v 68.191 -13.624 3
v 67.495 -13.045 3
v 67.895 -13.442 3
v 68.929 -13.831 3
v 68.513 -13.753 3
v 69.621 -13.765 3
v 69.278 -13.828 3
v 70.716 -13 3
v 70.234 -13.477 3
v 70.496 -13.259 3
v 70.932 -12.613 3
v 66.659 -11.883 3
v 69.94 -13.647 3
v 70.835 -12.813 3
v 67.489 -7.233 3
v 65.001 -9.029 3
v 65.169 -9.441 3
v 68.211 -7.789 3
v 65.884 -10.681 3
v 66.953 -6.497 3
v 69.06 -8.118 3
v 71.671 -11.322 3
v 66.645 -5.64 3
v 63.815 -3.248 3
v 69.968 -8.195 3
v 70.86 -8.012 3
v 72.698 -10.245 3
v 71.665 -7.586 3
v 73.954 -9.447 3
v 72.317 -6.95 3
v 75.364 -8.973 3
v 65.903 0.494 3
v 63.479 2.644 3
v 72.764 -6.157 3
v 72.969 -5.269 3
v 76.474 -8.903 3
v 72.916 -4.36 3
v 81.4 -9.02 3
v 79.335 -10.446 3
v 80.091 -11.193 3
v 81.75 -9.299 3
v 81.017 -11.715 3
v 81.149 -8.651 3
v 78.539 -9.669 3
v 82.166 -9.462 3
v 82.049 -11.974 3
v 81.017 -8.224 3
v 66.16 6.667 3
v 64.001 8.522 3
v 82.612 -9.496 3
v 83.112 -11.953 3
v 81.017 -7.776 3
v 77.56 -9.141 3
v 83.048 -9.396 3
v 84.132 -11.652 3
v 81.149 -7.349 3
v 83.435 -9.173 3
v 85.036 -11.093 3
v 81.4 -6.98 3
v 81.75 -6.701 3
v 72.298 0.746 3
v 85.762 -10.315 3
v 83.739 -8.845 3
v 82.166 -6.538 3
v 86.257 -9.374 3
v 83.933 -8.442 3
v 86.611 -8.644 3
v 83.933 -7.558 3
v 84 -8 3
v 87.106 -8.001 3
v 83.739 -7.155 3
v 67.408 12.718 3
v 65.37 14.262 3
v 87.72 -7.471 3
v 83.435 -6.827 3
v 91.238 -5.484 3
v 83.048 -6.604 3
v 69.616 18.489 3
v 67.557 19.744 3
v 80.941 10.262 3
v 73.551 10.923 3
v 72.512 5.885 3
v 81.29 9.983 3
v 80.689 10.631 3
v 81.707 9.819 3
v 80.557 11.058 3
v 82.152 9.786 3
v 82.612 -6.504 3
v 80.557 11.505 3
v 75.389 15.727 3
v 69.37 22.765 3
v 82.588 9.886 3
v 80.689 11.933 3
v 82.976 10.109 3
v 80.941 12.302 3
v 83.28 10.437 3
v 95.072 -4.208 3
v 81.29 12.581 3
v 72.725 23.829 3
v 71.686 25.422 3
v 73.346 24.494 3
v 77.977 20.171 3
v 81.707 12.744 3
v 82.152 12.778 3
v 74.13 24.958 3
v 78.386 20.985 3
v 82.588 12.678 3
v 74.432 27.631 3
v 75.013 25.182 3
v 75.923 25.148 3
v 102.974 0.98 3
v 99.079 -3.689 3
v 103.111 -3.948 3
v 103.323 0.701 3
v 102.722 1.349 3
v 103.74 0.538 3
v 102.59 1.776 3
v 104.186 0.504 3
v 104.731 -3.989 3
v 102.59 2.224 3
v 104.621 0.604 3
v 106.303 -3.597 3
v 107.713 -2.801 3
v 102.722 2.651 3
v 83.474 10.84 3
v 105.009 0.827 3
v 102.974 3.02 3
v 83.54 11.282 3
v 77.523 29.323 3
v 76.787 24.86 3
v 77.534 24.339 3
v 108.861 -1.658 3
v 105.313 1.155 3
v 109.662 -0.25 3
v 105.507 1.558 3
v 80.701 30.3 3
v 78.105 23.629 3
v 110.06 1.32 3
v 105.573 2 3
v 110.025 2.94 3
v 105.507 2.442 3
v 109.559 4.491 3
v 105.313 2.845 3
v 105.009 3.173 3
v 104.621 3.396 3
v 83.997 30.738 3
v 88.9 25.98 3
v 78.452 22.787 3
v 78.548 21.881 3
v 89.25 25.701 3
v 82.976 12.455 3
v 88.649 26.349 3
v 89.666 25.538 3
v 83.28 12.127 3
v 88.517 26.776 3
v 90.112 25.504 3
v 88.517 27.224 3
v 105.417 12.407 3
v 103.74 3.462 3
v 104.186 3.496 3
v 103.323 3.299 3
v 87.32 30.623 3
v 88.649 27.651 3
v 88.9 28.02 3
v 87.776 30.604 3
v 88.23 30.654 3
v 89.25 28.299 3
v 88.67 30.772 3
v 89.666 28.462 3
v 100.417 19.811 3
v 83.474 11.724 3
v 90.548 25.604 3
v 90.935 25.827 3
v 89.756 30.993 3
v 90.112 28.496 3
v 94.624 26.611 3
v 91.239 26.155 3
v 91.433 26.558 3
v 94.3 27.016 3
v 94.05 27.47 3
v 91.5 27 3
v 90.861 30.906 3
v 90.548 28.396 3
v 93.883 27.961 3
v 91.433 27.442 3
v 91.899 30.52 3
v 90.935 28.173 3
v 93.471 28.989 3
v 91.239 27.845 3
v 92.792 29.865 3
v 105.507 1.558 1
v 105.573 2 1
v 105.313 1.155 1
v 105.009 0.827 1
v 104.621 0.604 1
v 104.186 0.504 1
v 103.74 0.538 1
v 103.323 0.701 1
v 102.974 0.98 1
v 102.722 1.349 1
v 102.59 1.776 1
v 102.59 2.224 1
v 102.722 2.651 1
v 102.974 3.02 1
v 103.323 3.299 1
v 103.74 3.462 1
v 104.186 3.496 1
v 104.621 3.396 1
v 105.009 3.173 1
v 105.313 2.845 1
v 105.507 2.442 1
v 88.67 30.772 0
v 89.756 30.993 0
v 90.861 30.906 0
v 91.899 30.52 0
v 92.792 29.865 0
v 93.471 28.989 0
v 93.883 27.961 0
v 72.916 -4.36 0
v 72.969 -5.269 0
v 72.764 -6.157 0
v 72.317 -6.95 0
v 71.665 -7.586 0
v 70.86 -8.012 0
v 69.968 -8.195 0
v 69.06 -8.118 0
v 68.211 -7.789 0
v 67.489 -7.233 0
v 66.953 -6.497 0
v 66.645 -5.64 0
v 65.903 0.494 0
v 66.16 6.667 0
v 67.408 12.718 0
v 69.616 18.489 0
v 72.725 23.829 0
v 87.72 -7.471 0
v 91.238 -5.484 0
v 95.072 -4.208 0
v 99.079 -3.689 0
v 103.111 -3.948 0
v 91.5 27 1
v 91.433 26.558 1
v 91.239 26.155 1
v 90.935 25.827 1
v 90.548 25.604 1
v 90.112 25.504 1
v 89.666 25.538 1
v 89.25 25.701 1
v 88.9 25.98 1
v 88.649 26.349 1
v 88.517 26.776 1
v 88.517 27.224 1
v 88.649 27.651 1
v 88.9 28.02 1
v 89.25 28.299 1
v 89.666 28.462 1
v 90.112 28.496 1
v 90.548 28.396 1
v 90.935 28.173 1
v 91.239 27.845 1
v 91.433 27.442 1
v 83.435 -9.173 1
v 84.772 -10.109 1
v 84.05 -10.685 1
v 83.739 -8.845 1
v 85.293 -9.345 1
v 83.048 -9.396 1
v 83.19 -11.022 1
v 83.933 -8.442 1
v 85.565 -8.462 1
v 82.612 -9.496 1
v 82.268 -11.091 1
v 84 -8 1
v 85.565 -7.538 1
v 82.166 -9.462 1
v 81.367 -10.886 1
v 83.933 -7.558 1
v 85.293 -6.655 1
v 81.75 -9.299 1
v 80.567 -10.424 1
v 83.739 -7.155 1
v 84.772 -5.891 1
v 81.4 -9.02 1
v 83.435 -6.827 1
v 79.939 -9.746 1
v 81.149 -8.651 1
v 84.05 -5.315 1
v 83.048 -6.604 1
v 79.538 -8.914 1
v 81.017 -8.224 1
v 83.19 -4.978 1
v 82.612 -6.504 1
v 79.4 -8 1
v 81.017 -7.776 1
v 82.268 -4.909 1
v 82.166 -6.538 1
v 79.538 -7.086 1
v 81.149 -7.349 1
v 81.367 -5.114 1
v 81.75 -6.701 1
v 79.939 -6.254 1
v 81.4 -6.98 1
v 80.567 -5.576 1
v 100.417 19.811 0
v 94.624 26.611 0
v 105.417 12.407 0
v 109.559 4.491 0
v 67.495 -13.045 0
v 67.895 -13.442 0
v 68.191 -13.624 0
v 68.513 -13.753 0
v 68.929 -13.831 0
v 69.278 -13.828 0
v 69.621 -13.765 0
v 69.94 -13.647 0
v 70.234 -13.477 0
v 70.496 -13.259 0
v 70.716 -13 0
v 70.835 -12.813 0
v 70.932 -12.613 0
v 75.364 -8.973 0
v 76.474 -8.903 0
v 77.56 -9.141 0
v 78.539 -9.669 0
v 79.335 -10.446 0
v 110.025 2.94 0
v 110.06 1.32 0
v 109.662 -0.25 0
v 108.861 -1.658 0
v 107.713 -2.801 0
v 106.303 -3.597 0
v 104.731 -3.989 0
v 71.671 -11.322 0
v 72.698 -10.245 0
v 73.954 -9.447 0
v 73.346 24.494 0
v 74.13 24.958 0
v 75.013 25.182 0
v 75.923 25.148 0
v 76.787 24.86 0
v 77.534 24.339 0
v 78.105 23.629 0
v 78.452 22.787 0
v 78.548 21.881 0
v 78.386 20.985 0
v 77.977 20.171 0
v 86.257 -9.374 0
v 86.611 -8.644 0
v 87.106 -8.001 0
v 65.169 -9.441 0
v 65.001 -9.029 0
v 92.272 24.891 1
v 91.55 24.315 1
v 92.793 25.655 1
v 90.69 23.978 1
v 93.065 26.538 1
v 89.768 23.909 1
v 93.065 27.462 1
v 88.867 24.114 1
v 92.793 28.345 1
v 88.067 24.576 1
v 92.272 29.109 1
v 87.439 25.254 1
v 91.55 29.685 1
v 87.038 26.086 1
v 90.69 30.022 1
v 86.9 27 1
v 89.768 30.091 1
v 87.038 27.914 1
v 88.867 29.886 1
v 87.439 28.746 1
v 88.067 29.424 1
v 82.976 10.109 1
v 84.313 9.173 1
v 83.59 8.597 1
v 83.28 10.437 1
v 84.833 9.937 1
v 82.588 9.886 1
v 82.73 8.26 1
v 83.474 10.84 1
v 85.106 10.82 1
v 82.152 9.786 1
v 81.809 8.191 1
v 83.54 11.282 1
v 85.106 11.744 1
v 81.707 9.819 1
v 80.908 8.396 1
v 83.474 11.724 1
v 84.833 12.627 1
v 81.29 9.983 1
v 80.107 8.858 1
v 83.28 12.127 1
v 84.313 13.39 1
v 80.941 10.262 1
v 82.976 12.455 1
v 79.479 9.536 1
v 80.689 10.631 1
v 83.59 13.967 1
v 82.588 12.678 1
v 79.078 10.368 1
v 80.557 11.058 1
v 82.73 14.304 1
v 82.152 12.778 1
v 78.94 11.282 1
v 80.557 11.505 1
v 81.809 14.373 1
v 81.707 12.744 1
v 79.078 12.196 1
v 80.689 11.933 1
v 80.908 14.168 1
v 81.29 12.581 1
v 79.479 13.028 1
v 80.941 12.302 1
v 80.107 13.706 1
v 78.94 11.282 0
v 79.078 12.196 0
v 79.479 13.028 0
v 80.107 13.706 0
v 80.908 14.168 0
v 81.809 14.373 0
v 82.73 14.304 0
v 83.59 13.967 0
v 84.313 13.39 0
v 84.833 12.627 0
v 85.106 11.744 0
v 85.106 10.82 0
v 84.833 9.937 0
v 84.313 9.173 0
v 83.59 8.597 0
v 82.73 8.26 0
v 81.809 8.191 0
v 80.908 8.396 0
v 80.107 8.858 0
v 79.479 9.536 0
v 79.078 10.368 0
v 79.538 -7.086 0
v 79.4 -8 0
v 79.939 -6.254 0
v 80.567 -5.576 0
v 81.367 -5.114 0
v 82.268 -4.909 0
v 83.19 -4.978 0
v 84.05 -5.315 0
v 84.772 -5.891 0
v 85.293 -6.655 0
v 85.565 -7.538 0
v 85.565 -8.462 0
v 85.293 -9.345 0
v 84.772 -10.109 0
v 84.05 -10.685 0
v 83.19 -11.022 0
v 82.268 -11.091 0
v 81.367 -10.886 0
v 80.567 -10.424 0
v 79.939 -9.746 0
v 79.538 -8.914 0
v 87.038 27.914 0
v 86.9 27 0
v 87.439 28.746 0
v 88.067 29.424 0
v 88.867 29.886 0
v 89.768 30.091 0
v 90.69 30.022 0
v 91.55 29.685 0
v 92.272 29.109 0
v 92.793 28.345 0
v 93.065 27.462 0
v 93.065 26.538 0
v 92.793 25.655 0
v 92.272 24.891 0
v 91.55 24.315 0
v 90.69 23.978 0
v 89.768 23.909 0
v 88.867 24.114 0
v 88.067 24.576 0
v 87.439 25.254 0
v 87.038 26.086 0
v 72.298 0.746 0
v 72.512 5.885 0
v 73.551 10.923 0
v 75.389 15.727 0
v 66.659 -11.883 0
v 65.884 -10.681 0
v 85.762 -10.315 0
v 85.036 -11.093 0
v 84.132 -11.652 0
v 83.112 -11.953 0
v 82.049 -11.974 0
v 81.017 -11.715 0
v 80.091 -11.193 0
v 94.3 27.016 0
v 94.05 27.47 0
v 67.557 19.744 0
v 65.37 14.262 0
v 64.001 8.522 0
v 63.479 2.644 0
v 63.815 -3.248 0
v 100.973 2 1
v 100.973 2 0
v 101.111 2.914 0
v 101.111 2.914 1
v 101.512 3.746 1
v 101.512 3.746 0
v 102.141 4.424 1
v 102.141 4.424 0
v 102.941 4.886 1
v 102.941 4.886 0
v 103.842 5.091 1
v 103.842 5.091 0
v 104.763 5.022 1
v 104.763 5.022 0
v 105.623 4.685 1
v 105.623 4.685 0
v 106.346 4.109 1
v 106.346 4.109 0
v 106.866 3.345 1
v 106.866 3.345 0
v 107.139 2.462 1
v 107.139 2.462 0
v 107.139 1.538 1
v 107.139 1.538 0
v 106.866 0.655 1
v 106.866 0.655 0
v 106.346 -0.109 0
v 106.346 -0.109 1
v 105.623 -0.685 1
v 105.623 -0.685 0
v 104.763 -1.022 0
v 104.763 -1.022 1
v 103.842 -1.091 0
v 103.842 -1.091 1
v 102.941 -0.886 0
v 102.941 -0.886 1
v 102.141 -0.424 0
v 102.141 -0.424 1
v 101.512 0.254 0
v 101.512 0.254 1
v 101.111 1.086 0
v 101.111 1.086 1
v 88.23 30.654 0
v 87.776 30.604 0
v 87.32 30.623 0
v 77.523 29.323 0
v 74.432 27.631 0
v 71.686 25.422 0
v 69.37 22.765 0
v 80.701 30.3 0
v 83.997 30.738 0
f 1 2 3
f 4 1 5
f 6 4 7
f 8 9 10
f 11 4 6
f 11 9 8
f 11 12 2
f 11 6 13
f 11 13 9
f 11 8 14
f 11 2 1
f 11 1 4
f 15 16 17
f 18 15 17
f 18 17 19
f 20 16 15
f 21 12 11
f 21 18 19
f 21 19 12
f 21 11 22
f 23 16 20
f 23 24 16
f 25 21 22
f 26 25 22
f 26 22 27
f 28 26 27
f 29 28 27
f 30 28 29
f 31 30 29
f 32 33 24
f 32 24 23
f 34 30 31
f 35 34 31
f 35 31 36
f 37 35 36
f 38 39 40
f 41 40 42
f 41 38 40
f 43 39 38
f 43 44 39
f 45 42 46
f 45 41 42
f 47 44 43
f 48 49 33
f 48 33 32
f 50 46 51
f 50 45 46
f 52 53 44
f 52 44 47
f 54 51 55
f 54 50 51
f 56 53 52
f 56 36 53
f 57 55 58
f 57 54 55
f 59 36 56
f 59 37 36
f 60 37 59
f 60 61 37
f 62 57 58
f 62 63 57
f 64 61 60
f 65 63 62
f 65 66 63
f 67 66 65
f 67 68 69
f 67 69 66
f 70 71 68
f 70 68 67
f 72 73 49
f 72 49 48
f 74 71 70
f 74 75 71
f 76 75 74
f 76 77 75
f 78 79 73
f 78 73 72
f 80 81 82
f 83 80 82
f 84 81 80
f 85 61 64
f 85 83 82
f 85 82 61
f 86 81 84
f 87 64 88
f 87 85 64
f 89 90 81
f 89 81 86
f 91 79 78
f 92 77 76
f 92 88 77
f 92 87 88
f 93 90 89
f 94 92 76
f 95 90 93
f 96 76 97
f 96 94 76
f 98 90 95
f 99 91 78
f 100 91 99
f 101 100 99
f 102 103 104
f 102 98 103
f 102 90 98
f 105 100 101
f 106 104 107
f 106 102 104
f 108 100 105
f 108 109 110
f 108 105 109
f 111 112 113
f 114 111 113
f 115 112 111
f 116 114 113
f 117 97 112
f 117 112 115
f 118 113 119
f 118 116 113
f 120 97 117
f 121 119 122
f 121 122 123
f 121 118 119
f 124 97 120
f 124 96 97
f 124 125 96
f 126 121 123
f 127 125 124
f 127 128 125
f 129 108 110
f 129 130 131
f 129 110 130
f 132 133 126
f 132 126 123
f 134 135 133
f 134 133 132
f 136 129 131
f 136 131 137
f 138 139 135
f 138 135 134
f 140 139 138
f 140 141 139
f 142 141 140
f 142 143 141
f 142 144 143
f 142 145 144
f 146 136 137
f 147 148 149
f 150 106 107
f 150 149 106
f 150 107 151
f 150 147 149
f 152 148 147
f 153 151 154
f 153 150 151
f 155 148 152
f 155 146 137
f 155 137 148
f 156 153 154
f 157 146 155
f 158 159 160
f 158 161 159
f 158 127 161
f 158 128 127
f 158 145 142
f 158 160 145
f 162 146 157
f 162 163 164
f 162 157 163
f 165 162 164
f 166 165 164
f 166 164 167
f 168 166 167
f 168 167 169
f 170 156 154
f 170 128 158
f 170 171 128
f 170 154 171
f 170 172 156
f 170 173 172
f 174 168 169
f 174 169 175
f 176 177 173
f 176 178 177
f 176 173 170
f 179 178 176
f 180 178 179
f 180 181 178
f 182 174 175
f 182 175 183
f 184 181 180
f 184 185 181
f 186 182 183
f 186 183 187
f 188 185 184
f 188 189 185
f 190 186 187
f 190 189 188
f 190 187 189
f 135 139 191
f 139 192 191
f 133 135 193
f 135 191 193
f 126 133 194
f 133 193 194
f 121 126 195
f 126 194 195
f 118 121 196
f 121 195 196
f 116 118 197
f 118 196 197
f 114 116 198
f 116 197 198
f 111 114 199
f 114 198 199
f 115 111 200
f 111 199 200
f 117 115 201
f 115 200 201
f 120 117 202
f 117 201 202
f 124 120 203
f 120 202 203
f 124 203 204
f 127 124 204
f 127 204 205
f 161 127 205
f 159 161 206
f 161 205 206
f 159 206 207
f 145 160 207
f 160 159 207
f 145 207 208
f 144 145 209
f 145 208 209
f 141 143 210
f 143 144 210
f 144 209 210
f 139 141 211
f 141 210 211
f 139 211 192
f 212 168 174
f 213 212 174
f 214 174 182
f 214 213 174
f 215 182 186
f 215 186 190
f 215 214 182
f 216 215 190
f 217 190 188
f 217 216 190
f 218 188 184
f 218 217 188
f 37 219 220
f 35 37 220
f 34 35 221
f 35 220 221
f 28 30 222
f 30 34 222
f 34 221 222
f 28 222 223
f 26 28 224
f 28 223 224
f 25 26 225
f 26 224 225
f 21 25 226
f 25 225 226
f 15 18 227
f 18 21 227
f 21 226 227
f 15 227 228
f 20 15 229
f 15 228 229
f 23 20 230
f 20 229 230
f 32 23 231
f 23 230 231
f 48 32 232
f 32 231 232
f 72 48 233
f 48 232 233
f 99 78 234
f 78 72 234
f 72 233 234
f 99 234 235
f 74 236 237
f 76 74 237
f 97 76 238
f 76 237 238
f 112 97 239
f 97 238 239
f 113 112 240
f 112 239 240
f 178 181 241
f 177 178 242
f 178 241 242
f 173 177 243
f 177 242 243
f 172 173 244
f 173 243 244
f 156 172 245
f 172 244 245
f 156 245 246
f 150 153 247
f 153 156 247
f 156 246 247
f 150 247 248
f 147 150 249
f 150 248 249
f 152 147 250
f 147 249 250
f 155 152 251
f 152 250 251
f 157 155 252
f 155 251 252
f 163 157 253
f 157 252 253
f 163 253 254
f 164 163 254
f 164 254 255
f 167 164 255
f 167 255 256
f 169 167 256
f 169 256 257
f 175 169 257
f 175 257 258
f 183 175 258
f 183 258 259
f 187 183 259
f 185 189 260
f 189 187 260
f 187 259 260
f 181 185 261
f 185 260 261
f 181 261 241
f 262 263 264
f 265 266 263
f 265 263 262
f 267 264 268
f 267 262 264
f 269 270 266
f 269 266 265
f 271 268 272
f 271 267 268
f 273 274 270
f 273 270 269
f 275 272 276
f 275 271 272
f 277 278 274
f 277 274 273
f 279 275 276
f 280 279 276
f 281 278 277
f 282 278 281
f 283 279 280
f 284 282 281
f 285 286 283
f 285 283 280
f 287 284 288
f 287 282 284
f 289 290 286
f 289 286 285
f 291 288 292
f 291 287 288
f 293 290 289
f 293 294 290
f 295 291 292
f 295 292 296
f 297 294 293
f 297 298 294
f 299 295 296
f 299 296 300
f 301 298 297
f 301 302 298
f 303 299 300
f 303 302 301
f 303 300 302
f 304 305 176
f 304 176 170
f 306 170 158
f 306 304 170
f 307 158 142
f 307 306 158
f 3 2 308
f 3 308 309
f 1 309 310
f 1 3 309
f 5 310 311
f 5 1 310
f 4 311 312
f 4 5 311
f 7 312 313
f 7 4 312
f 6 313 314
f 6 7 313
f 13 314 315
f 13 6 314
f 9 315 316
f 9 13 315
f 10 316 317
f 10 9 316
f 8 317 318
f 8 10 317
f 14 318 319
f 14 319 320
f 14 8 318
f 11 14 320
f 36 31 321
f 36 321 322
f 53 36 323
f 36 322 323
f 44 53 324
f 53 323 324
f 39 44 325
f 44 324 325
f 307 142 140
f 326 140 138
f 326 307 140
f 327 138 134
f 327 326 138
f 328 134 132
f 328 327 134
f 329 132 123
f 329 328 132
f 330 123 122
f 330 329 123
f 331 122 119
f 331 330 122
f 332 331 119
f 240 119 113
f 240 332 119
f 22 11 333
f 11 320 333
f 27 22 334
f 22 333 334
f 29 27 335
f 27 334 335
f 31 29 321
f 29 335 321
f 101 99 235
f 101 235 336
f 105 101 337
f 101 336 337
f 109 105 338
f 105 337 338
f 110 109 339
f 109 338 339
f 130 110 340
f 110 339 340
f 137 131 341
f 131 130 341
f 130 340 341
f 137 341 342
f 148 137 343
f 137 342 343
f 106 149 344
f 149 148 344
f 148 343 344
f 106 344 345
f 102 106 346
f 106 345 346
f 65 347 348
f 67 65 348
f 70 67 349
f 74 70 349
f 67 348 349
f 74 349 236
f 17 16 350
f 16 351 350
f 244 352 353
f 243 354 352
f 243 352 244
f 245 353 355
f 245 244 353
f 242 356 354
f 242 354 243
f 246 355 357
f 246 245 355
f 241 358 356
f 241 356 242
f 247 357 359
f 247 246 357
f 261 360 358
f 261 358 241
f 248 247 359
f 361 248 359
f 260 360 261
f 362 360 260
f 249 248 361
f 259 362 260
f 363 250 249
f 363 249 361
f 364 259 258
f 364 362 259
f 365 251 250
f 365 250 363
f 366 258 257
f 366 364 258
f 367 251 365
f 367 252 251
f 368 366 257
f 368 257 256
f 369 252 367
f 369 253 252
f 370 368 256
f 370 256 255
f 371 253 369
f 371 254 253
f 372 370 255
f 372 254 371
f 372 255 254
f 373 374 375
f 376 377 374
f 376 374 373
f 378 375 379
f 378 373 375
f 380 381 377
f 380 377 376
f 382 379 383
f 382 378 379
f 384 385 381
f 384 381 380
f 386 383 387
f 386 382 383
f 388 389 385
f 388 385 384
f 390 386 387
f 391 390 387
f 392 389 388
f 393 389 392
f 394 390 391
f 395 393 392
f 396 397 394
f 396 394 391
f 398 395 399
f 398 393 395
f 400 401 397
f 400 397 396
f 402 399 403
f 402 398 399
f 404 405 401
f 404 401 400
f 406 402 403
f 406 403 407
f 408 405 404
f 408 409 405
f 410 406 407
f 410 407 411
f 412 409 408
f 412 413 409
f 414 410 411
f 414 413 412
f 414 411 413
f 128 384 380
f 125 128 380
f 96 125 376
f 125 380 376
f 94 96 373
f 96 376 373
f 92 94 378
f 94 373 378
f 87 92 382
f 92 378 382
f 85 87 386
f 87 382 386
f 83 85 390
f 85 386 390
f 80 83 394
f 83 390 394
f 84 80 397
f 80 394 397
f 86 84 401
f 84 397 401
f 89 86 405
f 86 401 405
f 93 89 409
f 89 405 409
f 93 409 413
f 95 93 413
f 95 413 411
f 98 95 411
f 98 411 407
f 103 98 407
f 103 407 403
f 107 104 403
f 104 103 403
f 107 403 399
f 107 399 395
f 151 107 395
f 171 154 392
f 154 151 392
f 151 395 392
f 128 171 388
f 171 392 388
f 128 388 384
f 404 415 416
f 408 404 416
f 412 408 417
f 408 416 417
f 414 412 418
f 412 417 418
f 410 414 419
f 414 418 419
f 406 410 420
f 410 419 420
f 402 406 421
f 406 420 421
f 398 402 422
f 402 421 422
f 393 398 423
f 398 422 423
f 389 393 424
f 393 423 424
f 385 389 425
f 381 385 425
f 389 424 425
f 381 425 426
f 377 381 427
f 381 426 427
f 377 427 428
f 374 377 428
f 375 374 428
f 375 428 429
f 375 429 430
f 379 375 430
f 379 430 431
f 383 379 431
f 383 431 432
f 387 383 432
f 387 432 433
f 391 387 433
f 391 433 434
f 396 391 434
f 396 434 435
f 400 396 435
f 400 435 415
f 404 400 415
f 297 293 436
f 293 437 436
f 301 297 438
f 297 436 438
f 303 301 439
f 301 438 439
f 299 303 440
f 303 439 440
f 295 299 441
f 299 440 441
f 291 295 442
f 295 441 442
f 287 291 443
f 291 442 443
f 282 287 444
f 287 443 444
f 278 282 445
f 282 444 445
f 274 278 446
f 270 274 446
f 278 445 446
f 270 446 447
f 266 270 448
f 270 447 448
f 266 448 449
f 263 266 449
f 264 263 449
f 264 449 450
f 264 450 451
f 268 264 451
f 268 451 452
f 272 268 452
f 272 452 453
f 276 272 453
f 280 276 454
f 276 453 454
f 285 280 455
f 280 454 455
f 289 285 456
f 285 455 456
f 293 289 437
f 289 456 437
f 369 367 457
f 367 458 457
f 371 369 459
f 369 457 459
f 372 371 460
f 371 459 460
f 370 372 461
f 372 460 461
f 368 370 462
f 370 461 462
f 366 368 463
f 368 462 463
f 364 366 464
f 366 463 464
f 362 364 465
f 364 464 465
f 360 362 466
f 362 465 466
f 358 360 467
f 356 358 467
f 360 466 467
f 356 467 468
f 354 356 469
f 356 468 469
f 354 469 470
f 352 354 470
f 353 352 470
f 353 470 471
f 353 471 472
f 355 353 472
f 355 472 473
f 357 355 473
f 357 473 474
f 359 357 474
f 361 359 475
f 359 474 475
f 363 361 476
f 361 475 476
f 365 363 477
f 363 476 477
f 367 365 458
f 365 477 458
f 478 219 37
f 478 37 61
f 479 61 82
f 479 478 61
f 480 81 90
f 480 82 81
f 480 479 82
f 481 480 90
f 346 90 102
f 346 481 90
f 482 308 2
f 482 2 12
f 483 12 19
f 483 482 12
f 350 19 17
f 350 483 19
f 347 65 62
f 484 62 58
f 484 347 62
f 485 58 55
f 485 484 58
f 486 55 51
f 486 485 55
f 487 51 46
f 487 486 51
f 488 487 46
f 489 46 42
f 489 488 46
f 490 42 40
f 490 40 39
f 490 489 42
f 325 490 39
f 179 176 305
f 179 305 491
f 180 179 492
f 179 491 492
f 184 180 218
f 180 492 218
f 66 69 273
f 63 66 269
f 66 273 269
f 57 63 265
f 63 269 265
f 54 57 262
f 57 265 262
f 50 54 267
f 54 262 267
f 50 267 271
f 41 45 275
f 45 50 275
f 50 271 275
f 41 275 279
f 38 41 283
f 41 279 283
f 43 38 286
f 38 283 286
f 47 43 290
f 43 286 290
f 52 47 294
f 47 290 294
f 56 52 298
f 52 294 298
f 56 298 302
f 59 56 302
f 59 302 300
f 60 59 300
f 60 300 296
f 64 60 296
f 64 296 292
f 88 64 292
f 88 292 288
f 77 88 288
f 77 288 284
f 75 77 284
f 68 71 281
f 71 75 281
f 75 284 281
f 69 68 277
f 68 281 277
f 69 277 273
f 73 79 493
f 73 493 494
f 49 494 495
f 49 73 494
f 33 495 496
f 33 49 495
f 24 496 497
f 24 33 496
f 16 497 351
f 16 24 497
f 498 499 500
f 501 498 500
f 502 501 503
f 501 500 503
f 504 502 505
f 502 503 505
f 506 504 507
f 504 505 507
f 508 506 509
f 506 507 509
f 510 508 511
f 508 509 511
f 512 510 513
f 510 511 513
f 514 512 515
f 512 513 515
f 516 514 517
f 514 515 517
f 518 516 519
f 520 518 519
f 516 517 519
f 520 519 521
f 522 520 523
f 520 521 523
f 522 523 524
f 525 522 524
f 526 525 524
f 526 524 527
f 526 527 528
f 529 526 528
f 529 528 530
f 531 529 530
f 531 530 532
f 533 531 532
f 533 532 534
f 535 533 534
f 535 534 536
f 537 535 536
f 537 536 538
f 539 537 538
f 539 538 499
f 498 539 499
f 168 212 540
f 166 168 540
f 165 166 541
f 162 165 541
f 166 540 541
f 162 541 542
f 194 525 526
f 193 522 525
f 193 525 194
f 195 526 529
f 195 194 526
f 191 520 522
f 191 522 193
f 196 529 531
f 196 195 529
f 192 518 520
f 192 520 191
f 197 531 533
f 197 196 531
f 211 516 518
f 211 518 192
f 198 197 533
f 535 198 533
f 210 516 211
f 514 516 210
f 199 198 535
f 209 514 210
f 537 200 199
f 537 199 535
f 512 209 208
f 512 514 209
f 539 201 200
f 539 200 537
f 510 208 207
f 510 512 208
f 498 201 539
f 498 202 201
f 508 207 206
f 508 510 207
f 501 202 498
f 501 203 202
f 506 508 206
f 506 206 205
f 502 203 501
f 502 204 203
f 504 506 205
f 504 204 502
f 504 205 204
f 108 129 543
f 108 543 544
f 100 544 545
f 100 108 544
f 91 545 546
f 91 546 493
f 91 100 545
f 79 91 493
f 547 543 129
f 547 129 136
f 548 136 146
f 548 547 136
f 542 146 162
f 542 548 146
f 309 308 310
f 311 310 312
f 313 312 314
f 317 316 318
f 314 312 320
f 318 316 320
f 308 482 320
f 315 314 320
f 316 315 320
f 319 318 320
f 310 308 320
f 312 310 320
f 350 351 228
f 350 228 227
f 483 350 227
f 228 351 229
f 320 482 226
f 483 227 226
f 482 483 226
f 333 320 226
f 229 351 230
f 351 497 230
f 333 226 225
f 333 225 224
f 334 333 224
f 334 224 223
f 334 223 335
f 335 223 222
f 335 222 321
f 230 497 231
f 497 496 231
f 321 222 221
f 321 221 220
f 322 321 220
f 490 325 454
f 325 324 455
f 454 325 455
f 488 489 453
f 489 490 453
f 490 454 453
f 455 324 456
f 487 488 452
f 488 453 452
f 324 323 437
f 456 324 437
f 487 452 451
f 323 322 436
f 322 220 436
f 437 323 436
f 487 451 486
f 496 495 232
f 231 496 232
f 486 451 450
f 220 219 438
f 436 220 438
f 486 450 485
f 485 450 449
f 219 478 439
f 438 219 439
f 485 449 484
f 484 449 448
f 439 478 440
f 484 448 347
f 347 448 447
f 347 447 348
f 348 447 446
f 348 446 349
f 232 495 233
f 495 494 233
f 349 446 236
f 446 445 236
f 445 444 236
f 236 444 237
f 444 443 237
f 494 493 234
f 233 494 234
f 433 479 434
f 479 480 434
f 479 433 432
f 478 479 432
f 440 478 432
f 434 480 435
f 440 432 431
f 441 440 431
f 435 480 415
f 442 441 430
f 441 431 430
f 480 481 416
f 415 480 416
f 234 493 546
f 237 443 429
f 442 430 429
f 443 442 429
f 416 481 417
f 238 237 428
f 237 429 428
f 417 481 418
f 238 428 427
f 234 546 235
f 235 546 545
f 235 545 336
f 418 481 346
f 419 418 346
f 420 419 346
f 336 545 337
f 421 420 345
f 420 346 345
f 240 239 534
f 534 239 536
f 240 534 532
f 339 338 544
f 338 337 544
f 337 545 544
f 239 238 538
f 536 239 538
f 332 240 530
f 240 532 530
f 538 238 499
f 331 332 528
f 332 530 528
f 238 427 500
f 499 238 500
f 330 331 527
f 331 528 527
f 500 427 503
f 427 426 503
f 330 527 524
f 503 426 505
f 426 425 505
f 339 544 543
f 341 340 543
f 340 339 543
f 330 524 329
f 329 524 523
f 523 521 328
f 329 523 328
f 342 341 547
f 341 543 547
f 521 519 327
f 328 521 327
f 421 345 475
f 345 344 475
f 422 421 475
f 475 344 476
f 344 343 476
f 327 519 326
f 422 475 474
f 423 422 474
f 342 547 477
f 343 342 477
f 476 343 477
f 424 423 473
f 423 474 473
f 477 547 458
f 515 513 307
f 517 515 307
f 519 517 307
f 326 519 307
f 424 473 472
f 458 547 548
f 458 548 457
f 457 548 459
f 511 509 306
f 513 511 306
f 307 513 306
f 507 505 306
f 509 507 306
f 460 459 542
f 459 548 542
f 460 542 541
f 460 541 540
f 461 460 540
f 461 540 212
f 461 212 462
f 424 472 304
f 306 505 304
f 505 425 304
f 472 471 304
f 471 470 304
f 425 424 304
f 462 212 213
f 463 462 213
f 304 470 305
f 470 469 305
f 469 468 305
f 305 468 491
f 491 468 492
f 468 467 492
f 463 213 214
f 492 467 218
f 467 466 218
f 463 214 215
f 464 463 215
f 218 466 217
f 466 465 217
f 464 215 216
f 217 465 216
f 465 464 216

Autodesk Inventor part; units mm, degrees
ref_plane "YZ Plane" through (0, 0, 0) normal (1, 0, 0) x (0, 1, 0)
ref_plane "XZ Plane" through (0, 0, 0) normal (0, 1, 0) x (-1, 0, 0)
ref_plane "XY Plane" through (0, 0, 0) normal (0, 0, 1) x (1, 0, 0)
sketch "スケッチ1" plane through (0, 0, 0) normal (0, 0, 1) x (1, 0, 0)
  line L0 (108, 72.831817) -> (108, -27.637331) construction
  circle A0 centre (90, 27) radius 3
  circle A1 centre (104.07345, 2) radius 6.025
  circle A2 centre (90, 27) radius 1.5
  circle A3 centre (104.07345, 2) radius 1.5
  circle A4 centre (82.04031, 11.281864) radius 1.5
  circle A5 centre (82.5, -8) radius 3
  circle A6 centre (82.5, -8) radius 1.5
  arc A7 (66.645247, -5.64) -> (72.915941, -4.36) centre (69.780594, -5) ccw
  arc A8 (72.724551, 23.828571) -> (66.645247, -5.64) centre (104.07345, 2) ccw
  arc A9 (77.976723, 20.171429) -> (72.915941, -4.36) centre (104.07345, 2) ccw
  arc A10 (77.976723, 20.171429) -> (72.724551, 23.828571) centre (75.350637, 22) ccw
  circle A11 centre (137.322151, 20) radius 1.25
  circle A12 centre (133.5, -8) radius 3
  circle A13 centre (133.5, -8) radius 1.5
  circle A14 centre (146, 10) radius 1.5
  arc A15 (-6.089587, 13.373015) -> (73.990447, 1.93301) centre (42.288654, 66.020578) ccw construction
  line L1 (108, 72.831817) -> (108, -27.637331) construction
  arc A16 (142.009553, 1.93301) -> (222.089587, 13.373015) centre (173.711346, 66.020578) ccw construction
  arc A17 (142.29705, -19.072921) -> (142.660887, 27.253552) centre (125.709293, 4.222021) ccw
  arc A18 (136.80781, 35.127338) -> (180.06622, 10.718677) centre (180.861669, 62.665248) ccw
  circle A19 centre (137.322151, 20) radius 9.006449
  arc A20 (128.322651, 20.353731) -> (130.555913, -8.5765) centre (253.226204, 15.444317) ccw
  arc A21 (133.414591, -10.998784) -> (152.948723, -4.485529) centre (134.268683, 18.989056) ccw
  arc A22 (35.93378, 10.718677) -> (79.19219, 35.127338) centre (35.138331, 62.665248) ccw
  arc A23 (73.339113, 27.253552) -> (73.70295, -19.072921) centre (90.290707, 4.222021) ccw
  arc A24 (90.887703, 29.865656) -> (71.118535, 25.188537) centre (84.969685, 10.761283) ccw
  arc A25 (109.559222, 4.491371) -> (92.075879, 29.165808) centre (36.719095, -28.589074) ccw
  arc A26 (80.567193, -10.294397) -> (70.653319, -16.566942) centre (76.603177, -15) ccw
  circle A27 centre (76.603177, -15) radius 5 construction
  circle A28 centre (94, -11) radius 1.5
  circle A29 centre (94, -11) radius 3
  arc A30 (103.111347, -3.947687) -> (84.657245, -10.084777) centre (99.757959, -24.678215) ccw
  point P0 (0, 0)
  point P1 (0, 0)
  point P2 (153.490711, -2.560367)
  point P3 (70.420594, -8.135347)
  point P4 (68.814065, 23.104865)
  dimension "d0" = 2
  dimension "d1" = 30
  dimension "d2" = 125
  dimension "d3" = 80
  dimension "d4" = 20
  dimension "d5" = 6
  dimension "d6" = 21
extrude "押し出し1" add sketch "スケッチ1" along normal blind 3 contours A0 | A0 A25 A1 A30 A5 A26 A23 A22 A24 | A1 | A5
fillet "フィレット1" radius 5 1 edges at (68.8141, 23.1049, 1.5)
fillet "フィレット2" radius 2 1 edges at (70.6533, -16.5669, 1.5)
sketch "スケッチ2" plane through (0, 0, 0) normal (0, 0, -1) x (-1, 0, 0)
  circle A0 centre (-82.04031, 11.281864) radius 1.5
  arc A1 (-70.932275, -12.613165) -> (-67.494617, -13.044892) centre (-69.088898, -11.837303) ccw
  arc A2 (-67.494617, -13.044892) -> (-68.54743, 22.797215) centre (-90.290707, 4.222021) ccw
  arc A3 (-68.54743, 22.797215) -> (-69.082243, 23.334729) centre (-72.349055, 19.549502) ccw
  arc A4 (-71.118535, 25.188537) -> (-69.082243, 23.334729) centre (-35.138331, 62.665248) ccw
  arc A5 (-71.118535, 25.188537) -> (-90.887703, 29.865656) centre (-84.969685, 10.761283) ccw
  arc A6 (-90.887703, 29.865656) -> (-92.075879, 29.165808) centre (-90, 27) ccw
  arc A7 (-92.075879, 29.165808) -> (-109.559222, 4.491371) centre (-36.719095, -28.589074) ccw
  arc A8 (-109.559222, 4.491371) -> (-103.111347, -3.947687) centre (-104.07345, 2) ccw
  arc A9 (-84.657245, -10.084777) -> (-103.111347, -3.947687) centre (-99.757959, -24.678215) ccw
  arc A10 (-84.657245, -10.084777) -> (-80.567193, -10.294397) centre (-82.5, -8) ccw
  arc A11 (-70.932275, -12.613165) -> (-80.567193, -10.294397) centre (-76.603177, -15) ccw
  circle A12 centre (-82.5, -8) radius 1.5
  circle A13 centre (-104.07345, 2) radius 1.5
  circle A14 centre (-90, 27) radius 1.5
  circle A15 centre (-82.04031, 11.281864) radius 1.5
  arc A16 (-72.724551, 23.828571) -> (-77.976723, 20.171429) centre (-75.350637, 22) ccw
  arc A17 (-66.645247, -5.64) -> (-72.724551, 23.828571) centre (-104.07345, 2) ccw
  arc A18 (-72.915941, -4.36) -> (-66.645247, -5.64) centre (-69.780594, -5) ccw
  arc A19 (-72.915941, -4.36) -> (-77.976723, 20.171429) centre (-104.07345, 2) ccw
  circle A20 centre (-90, 27) radius 3.1
  circle A21 centre (-82.04031, 11.281864) radius 3.1
  circle A22 centre (-104.07345, 2) radius 3.1
  circle A23 centre (-82.5, -8) radius 3.1
  arc A24 (-86.256515, -9.37426) -> (-87.720107, -7.470946) centre (-90.013031, -10.748521) ccw
  arc A25 (-86.256515, -9.37426) -> (-79.334786, -10.445694) centre (-82.5, -8) ccw
  arc A26 (-75.363887, -8.973369) -> (-79.334786, -10.445694) centre (-76.169572, -12.891388) ccw
  arc A27 (-70.932275, -12.613165) -> (-80.567193, -10.294397) centre (-76.603177, -15) ccw
  arc A28 (-94.623726, 26.61105) -> (-93.882942, 27.960603) centre (-96.795149, 28.681055) ccw
  arc A29 (-88.670242, 30.772498) -> (-93.882942, 27.960603) centre (-90, 27) ccw
  arc A30 (-88.670242, 30.772498) -> (-87.320327, 30.622665) centre (-87.672923, 33.601872) ccw
  point P0 (0, 0)
  dimension "d11" = 6.2
  dimension "d12" = 6.2
  dimension "d13" = 6.2
  dimension "d14" = 6.2
  dimension "d15" = 4
  dimension "d16" = 4
  dimension "d17" = 4
  dimension "d18" = 4
  dimension "d19" = 3
  dimension "d20" = 3
extrude "押し出し2" add sketch "スケッチ2" against normal up to surface (3 mm away) contours A26 A25 A24 A9 A23 A11 | A23 A9 A10 A11 | A5 A20 A7 A28 A29 A30 | A5 A6 A7 A20 picked at (-81.994217, -10.979131) picked at (-91.467973, 29.678904)
extrude "押し出し3" cut sketch "スケッチ2" against normal blind 1 contours A23 A9 A10 A11 | A11 A10 A9 A23 | A20 A7 A6 A5 | A5 A6 A7 A20 | A12 | A14 | A21 | A22
sketch "スケッチ4" plane through (0, 0, 3) normal (0, 0, 1) x (1, 0, 0)
  arc A0 (67.494617, -13.044892) -> (70.932275, -12.613165) centre (69.088898, -11.837303) ccw
  arc A1 (75.363887, -8.973369) -> (70.932275, -12.613165) centre (76.603177, -15) ccw
  arc A2 (79.334786, -10.445694) -> (75.363887, -8.973369) centre (76.169572, -12.891388) ccw
  arc A3 (79.334786, -10.445694) -> (86.256515, -9.37426) centre (82.5, -8) ccw
  arc A4 (87.720107, -7.470946) -> (86.256515, -9.37426) centre (90.013031, -10.748521) ccw
  arc A5 (103.111347, -3.947687) -> (87.720107, -7.470946) centre (99.757959, -24.678215) ccw
  arc A6 (103.111347, -3.947687) -> (109.559222, 4.491371) centre (104.07345, 2) ccw
  arc A7 (109.559222, 4.491371) -> (94.623726, 26.61105) centre (36.719095, -28.589074) ccw
  arc A8 (93.882942, 27.960603) -> (94.623726, 26.61105) centre (96.795149, 28.681055) ccw
  arc A9 (93.882942, 27.960603) -> (88.670242, 30.772498) centre (90, 27) ccw
  arc A10 (87.320327, 30.622665) -> (88.670242, 30.772498) centre (87.672923, 33.601872) ccw
  arc A11 (87.320327, 30.622665) -> (71.118535, 25.188537) centre (84.969685, 10.761283) ccw
  arc A12 (69.082243, 23.334729) -> (71.118535, 25.188537) centre (35.138331, 62.665248) ccw
  arc A13 (69.082243, 23.334729) -> (68.54743, 22.797215) centre (72.349055, 19.549502) ccw
  arc A14 (68.54743, 22.797215) -> (67.494617, -13.044892) centre (90.290707, 4.222021) ccw
  circle A15 centre (82.5, -8) radius 1.5
  circle A16 centre (104.07345, 2) radius 1.5
  circle A17 centre (90, 27) radius 1.5
  circle A18 centre (82.04031, 11.281864) radius 1.5
  arc A19 (77.976723, 20.171429) -> (72.724551, 23.828571) centre (75.350637, 22) ccw
  arc A20 (77.976723, 20.171429) -> (72.915941, -4.36) centre (104.07345, 2) ccw
  arc A21 (66.645247, -5.64) -> (72.915941, -4.36) centre (69.780594, -5) ccw
  arc A22 (72.724551, 23.828571) -> (66.645247, -5.64) centre (104.07345, 2) ccw
  arc A23 (70.112674, 24.248139) -> (65.061877, -9.243272) centre (104.07345, 2) ccw
  arc A24 (72.724551, 23.828571) -> (66.645247, -5.64) centre (104.07345, 2) ccw
  arc A25 (77.522944, 29.323235) -> (67.556607, 19.743566) centre (85.545451, 11.002771) ccw
  point P0 (0, 0)
  dimension "d28" = 20
sketch "スケッチ4 outline for 押し出し4" plane through (0, 0, 3) normal (0, 0, 1) x (1, 0, 0)
  arc A0 (69.082243, 23.334729) -> (68.54743, 22.797215) centre (72.349055, 19.549502) ccw
  arc A1 (68.54743, 22.797215) -> (65.061877, -9.243272) centre (90.290707, 4.222021) ccw
  arc A2 (65.061877, -9.243272) -> (67.556607, 19.743566) centre (104.07345, 2) cw
  arc A3 (67.556607, 19.743566) -> (77.522944, 29.323235) centre (85.545451, 11.002771) cw
  arc A4 (77.522944, 29.323235) -> (71.118535, 25.188537) centre (84.969685, 10.761283) ccw
  arc A5 (71.118535, 25.188537) -> (69.082243, 23.334729) centre (35.138331, 62.665248) cw
extrude "押し出し4" cut sketch "スケッチ4 outline for 押し出し4" against normal blind 10
fillet "フィレット3" radius 2 1 edges at (65.0619, -9.2433, 1.5)
properties part number "アンノーン前" material "アルミニウム 2014-T4"
